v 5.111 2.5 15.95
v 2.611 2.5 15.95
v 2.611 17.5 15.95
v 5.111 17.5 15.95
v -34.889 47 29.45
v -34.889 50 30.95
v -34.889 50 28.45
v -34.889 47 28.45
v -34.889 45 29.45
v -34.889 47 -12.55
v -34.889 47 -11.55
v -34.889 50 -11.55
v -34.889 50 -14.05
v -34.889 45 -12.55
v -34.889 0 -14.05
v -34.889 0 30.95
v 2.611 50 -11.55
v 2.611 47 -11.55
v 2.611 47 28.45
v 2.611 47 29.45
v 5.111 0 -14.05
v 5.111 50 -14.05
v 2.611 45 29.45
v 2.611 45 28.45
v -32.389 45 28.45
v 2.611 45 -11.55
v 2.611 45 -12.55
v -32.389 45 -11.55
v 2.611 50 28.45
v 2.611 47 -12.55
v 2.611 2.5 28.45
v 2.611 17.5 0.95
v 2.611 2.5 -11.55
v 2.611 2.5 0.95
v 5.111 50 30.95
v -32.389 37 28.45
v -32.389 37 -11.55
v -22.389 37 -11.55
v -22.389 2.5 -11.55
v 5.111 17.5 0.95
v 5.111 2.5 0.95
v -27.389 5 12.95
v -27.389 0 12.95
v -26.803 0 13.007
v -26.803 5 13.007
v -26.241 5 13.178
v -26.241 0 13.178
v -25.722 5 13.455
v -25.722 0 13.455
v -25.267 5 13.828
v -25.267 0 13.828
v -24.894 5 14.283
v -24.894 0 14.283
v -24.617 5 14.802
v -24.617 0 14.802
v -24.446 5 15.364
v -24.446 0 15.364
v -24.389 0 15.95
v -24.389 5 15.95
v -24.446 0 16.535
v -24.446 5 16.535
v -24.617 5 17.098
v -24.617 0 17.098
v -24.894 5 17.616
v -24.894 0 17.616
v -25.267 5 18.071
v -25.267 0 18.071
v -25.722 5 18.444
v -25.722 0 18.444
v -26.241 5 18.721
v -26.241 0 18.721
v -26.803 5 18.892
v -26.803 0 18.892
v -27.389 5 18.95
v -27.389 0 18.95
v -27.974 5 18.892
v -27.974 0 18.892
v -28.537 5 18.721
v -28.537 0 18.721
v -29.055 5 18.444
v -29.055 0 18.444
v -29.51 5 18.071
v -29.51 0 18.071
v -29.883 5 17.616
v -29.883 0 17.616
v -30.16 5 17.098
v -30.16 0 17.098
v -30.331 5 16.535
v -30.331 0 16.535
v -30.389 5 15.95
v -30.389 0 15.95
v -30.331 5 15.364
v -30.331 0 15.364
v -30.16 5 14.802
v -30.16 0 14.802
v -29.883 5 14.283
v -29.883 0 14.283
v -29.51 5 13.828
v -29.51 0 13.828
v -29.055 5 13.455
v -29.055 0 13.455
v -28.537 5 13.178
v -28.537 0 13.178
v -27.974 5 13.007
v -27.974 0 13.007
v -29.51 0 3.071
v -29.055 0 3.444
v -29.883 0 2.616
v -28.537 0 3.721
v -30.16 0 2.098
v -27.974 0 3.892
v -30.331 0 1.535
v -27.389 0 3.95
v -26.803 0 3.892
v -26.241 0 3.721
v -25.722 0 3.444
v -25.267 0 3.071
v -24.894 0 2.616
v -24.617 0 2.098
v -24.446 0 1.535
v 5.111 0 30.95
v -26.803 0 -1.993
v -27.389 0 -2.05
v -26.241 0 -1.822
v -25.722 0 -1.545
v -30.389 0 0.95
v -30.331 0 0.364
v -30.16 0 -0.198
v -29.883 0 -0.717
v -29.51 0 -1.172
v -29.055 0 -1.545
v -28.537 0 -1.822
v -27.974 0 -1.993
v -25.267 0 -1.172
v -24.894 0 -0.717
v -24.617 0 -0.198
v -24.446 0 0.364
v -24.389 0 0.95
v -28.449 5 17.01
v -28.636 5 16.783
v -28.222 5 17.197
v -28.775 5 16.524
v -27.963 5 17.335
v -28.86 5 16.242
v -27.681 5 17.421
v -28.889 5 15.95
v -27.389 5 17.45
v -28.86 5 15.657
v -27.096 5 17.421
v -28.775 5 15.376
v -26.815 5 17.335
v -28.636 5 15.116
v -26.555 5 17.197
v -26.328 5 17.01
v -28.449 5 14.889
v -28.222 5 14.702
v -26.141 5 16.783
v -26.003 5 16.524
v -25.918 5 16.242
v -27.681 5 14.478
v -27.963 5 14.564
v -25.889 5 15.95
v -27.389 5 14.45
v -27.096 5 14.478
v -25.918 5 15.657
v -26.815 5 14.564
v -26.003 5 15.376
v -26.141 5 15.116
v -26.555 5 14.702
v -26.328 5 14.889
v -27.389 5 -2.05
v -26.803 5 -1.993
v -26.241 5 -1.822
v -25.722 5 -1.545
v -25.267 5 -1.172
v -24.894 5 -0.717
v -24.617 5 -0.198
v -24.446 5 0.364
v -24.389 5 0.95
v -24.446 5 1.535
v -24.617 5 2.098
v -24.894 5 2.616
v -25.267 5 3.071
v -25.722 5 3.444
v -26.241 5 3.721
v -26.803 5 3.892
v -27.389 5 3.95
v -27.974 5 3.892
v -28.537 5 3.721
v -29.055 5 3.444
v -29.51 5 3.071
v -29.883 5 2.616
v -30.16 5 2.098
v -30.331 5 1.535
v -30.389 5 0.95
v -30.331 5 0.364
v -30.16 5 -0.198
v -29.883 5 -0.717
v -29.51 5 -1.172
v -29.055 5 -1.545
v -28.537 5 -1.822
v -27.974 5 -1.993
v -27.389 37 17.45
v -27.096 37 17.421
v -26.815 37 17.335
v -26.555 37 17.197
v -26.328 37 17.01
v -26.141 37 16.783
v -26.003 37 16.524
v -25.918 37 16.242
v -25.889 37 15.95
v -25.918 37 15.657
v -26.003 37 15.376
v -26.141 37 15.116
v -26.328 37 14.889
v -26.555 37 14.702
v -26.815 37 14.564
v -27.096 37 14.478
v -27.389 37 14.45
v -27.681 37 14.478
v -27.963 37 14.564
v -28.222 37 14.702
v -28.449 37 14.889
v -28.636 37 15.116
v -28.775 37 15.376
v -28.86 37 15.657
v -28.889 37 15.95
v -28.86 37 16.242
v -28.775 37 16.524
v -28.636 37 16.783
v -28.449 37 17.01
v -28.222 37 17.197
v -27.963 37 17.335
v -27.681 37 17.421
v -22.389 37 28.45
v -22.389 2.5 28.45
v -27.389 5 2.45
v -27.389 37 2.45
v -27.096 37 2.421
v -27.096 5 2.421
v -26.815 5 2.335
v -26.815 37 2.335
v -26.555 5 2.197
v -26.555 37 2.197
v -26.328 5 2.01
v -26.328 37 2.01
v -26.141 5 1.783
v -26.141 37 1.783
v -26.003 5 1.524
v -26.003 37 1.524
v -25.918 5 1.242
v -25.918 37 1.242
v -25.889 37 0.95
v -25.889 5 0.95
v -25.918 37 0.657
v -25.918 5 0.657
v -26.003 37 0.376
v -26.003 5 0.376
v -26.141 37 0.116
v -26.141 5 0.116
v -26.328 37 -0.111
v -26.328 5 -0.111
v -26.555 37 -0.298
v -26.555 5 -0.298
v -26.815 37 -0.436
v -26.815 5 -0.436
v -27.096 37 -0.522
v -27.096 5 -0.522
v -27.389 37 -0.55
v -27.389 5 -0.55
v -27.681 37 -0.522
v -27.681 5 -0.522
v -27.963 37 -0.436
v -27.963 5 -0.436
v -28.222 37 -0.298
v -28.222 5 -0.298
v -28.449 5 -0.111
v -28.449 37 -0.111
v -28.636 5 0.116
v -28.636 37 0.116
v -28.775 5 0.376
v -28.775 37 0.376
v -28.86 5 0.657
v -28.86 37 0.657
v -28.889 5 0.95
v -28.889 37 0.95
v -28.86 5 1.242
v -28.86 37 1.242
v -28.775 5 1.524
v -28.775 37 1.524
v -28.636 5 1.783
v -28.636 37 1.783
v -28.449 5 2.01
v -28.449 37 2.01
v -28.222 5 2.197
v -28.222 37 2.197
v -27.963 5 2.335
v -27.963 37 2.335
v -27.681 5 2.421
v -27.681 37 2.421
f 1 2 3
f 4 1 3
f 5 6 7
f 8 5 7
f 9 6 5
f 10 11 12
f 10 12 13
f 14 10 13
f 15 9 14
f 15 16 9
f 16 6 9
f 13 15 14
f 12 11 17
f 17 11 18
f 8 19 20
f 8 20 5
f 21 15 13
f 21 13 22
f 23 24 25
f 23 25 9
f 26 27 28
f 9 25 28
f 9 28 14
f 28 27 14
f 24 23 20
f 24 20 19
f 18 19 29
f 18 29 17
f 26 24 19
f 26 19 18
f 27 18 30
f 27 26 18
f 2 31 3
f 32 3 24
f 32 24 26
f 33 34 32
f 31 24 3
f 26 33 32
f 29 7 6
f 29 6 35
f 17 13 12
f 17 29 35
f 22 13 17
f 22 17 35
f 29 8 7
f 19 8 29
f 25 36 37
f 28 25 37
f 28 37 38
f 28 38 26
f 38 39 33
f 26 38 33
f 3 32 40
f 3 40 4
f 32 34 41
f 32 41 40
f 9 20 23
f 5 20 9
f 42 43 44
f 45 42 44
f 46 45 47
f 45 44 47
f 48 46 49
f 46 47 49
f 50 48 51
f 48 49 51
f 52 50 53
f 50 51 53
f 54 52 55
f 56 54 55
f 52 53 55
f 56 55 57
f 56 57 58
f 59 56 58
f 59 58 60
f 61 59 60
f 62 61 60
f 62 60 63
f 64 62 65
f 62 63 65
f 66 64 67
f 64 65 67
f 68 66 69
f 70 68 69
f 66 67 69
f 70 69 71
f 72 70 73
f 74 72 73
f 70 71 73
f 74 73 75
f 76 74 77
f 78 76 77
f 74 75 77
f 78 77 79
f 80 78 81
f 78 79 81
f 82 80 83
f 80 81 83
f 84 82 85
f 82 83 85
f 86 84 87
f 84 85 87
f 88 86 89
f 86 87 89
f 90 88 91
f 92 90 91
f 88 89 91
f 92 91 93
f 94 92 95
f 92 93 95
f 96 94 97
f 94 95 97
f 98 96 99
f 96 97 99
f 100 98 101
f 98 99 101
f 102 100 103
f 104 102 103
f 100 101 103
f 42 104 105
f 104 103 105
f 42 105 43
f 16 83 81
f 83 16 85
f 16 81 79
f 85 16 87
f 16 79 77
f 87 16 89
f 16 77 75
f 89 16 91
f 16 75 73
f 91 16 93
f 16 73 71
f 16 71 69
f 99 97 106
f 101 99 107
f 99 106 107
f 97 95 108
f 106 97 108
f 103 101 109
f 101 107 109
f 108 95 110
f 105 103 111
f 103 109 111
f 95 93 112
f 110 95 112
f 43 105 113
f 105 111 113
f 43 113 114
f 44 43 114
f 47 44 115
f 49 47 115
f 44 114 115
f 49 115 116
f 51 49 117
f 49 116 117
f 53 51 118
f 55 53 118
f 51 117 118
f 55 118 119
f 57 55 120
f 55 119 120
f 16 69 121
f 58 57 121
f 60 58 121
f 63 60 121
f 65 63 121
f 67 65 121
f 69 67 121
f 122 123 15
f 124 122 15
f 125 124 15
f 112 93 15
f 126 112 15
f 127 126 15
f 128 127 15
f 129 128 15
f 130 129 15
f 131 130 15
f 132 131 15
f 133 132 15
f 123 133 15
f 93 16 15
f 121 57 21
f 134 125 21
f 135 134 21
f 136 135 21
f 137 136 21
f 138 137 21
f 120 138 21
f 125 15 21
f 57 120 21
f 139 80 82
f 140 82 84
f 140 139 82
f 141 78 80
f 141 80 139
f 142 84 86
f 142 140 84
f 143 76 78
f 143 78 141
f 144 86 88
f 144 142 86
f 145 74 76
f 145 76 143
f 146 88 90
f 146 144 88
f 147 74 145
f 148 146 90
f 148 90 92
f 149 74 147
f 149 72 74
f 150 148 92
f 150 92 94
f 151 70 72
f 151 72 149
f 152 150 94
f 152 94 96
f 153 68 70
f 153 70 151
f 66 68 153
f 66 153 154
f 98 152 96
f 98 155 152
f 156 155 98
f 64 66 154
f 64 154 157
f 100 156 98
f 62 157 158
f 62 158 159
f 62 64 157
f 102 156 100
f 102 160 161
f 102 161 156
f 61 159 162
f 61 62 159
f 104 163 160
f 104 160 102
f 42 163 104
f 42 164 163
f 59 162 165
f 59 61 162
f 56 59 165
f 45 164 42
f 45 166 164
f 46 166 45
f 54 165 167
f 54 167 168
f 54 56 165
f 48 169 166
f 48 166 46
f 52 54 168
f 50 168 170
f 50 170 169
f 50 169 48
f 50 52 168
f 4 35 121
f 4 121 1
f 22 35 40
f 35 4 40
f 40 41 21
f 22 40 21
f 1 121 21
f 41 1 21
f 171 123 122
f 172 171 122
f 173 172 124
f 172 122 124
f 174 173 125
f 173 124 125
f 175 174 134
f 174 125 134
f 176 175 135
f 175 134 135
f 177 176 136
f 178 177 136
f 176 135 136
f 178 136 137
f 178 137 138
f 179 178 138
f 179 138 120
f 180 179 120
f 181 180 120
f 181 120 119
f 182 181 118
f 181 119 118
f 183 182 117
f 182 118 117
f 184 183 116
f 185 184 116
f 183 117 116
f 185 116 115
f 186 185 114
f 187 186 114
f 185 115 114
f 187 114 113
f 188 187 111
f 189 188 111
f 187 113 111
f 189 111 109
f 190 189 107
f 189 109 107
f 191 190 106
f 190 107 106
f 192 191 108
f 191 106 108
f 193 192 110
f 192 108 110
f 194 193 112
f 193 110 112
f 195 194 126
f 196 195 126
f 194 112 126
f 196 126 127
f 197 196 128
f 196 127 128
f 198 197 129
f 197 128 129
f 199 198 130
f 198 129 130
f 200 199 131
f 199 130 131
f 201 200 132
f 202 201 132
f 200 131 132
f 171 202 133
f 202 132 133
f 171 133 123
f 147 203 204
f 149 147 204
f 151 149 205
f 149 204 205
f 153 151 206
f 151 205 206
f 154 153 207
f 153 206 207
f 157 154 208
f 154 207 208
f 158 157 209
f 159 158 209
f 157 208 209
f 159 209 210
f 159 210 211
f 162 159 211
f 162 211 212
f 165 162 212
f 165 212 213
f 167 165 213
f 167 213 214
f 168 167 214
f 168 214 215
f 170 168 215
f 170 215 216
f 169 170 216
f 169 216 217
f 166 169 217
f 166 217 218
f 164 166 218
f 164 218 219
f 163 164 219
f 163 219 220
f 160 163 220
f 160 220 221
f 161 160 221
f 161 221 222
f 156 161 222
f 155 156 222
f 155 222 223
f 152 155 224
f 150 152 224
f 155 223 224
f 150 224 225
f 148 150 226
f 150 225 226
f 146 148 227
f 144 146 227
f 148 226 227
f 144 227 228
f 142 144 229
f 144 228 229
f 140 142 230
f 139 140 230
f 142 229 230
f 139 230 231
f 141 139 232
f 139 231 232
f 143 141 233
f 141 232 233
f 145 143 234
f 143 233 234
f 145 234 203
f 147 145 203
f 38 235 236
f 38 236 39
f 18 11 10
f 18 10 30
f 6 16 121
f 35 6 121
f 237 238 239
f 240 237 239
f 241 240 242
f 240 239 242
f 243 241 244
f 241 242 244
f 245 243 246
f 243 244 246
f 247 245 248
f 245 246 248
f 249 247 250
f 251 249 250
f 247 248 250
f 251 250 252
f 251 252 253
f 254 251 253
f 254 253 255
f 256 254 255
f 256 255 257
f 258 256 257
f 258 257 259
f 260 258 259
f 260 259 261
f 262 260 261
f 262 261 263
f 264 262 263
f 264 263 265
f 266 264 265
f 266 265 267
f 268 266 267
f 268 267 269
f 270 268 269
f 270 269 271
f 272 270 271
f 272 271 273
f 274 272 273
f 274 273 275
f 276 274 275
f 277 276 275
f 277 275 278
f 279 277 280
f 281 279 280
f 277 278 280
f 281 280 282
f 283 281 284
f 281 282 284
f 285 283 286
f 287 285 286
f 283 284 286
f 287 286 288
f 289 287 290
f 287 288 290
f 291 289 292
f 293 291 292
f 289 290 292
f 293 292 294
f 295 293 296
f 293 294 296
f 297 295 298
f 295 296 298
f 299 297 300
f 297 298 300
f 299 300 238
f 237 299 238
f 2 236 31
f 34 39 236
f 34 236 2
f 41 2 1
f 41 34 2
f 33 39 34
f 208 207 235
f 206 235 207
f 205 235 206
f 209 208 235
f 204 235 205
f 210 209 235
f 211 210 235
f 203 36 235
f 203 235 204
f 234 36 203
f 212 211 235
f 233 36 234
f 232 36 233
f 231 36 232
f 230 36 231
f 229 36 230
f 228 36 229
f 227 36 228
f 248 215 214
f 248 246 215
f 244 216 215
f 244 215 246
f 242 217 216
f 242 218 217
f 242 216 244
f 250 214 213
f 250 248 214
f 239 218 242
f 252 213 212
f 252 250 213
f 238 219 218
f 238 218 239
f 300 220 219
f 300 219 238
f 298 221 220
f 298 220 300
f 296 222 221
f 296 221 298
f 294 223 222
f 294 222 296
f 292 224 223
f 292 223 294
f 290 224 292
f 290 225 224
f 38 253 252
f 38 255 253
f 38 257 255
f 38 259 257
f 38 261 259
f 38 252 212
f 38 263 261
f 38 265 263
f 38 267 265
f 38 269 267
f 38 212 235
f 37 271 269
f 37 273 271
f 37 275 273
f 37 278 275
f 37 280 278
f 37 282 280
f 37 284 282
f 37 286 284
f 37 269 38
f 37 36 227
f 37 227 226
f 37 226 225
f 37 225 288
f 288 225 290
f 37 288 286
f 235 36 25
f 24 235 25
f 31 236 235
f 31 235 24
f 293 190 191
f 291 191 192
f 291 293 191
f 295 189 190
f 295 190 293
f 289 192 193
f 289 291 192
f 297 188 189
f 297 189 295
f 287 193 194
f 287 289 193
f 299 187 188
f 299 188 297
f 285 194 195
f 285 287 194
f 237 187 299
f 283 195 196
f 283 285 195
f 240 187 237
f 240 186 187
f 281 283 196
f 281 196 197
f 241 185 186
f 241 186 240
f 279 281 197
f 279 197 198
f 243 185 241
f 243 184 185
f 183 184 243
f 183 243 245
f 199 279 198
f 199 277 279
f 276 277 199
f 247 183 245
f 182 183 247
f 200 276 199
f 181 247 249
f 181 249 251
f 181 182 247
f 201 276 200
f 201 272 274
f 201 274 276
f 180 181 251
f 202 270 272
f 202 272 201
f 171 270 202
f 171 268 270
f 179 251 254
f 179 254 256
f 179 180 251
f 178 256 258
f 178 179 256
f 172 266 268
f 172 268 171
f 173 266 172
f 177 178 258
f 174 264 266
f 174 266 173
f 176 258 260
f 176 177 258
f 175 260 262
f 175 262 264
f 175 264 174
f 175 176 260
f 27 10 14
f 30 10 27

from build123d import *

# Parameters (mm, degrees)
SKETCH1_W           = 40
SKETCH1_H           = 45
BOSS_EXTRUDE1_DEPTH = 50
SHELL1_T            = -2.5
SKETCH3_W           = 40
SKETCH3_H           = 34.5
BOSS_EXTRUDE2_DEPTH = 10
SKETCH11_W          = 40
SKETCH11_H          = 5
CUT_EXTRUDE2_DEPTH  = 2.5
SKETCH12_W          = 37.5
SKETCH12_H          = 2
CUT_EXTRUDE3_DEPTH  = 1
SKETCH13_W          = 37.5
SKETCH13_H          = 2
CUT_EXTRUDE4_DEPTH  = 1
SKETCH15_R          = 1.5
CUT_EXTRUDE7_DEPTH  = 37
SKETCH16_R          = 1.5
CUT_EXTRUDE8_DEPTH  = 37
SKETCH17_R          = 3
CUT_EXTRUDE9_DEPTH  = 5
SKETCH19_W          = 15
SKETCH19_H          = 15
CUT_EXTRUDE10_DEPTH = 2.5


with BuildPart() as part:
    # Sketch1 → Boss-Extrude1 (new body)
    with BuildSketch(Plane(origin=(0, 0, 0), x_dir=(1, 0, 0), z_dir=(0, 1, 0))):
        with Locations((-14.888700463, -8.449653636)):
            Rectangle(SKETCH1_W, SKETCH1_H)
    extrude(amount=BOSS_EXTRUDE1_DEPTH)

    # Shell1
    shell1_openings = [part.faces().sort_by_distance(p)[0] for p in [
        (-14.888700463, 50, 8.449653636),
    ]]
    offset(amount=SHELL1_T, openings=shell1_openings, kind=Kind.INTERSECTION)

    # Sketch3 → Boss-Extrude2 (add)
    with BuildSketch(Plane(origin=(-32.388700463, 0, 0), x_dir=(0, 0, -1), z_dir=(1, 0, 0))):
        with Locations((-8.449653636, 19.75)):
            Rectangle(SKETCH3_W, SKETCH3_H)
    extrude(amount=BOSS_EXTRUDE2_DEPTH)

    # Sketch11 → Cut-Extrude2 (cut)
    with BuildSketch(Plane(origin=(-32.388700463, 0, 0), x_dir=(0, 0, -1), z_dir=(1, 0, 0))):
        with Locations((-8.449653636, 47.5)):
            Rectangle(SKETCH11_W, SKETCH11_H)
    extrude(amount=-CUT_EXTRUDE2_DEPTH, mode=Mode.SUBTRACT)

    # Sketch12 → Cut-Extrude3 (cut)
    with BuildSketch(Plane.XY.offset(-11.550346364)):
        with Locations((-16.138700463, 46)):
            Rectangle(SKETCH12_W, SKETCH12_H)
    extrude(amount=-CUT_EXTRUDE3_DEPTH, mode=Mode.SUBTRACT)

    # Sketch13 → Cut-Extrude4 (cut)
    with BuildSketch(Plane(origin=(0, 0, 28.449653636), x_dir=(-1, 0, 0), z_dir=(0, 0, -1))):
        with Locations((16.138700463, 46)):
            Rectangle(SKETCH13_W, SKETCH13_H)
    extrude(amount=-CUT_EXTRUDE4_DEPTH, mode=Mode.SUBTRACT)

    # Sketch15 → Cut-Extrude7 (cut)
    with BuildSketch(Plane(origin=(0, 37, 0), x_dir=(1, 0, 0), z_dir=(0, 1, 0))):
        with Locations(Location((-27.388700463, -15.949653636, 0), (0, 0, 270))):
            Circle(SKETCH15_R)
    extrude(amount=-CUT_EXTRUDE7_DEPTH, mode=Mode.SUBTRACT)

    # Sketch16 → Cut-Extrude8 (cut)
    with BuildSketch(Plane(origin=(0, 37, 0), x_dir=(1, 0, 0), z_dir=(0, 1, 0))):
        with Locations(Location((-27.388700463, -0.949653636, 0), (0, 0, 270))):
            Circle(SKETCH16_R)
    extrude(amount=-CUT_EXTRUDE8_DEPTH, mode=Mode.SUBTRACT)

    # Sketch17 → Cut-Extrude9 (cut)
    with BuildSketch(Plane.XZ):
        with Locations(Location((-27.388700463, 15.949653636, 0), (0, 0, 270))):
            Circle(SKETCH17_R)
        with Locations(Location((-27.388700463, 0.949653636, 0), (0, 0, 270))):
            Circle(SKETCH17_R)
    extrude(amount=-CUT_EXTRUDE9_DEPTH, mode=Mode.SUBTRACT)

    # Sketch19 → Cut-Extrude10 (cut)
    with BuildSketch(Plane.ZY.offset(-2.611299537)):
        with Locations((8.449653636, 10)):
            Rectangle(SKETCH19_W, SKETCH19_H)
    extrude(amount=-CUT_EXTRUDE10_DEPTH, mode=Mode.SUBTRACT)


solid = part.part
